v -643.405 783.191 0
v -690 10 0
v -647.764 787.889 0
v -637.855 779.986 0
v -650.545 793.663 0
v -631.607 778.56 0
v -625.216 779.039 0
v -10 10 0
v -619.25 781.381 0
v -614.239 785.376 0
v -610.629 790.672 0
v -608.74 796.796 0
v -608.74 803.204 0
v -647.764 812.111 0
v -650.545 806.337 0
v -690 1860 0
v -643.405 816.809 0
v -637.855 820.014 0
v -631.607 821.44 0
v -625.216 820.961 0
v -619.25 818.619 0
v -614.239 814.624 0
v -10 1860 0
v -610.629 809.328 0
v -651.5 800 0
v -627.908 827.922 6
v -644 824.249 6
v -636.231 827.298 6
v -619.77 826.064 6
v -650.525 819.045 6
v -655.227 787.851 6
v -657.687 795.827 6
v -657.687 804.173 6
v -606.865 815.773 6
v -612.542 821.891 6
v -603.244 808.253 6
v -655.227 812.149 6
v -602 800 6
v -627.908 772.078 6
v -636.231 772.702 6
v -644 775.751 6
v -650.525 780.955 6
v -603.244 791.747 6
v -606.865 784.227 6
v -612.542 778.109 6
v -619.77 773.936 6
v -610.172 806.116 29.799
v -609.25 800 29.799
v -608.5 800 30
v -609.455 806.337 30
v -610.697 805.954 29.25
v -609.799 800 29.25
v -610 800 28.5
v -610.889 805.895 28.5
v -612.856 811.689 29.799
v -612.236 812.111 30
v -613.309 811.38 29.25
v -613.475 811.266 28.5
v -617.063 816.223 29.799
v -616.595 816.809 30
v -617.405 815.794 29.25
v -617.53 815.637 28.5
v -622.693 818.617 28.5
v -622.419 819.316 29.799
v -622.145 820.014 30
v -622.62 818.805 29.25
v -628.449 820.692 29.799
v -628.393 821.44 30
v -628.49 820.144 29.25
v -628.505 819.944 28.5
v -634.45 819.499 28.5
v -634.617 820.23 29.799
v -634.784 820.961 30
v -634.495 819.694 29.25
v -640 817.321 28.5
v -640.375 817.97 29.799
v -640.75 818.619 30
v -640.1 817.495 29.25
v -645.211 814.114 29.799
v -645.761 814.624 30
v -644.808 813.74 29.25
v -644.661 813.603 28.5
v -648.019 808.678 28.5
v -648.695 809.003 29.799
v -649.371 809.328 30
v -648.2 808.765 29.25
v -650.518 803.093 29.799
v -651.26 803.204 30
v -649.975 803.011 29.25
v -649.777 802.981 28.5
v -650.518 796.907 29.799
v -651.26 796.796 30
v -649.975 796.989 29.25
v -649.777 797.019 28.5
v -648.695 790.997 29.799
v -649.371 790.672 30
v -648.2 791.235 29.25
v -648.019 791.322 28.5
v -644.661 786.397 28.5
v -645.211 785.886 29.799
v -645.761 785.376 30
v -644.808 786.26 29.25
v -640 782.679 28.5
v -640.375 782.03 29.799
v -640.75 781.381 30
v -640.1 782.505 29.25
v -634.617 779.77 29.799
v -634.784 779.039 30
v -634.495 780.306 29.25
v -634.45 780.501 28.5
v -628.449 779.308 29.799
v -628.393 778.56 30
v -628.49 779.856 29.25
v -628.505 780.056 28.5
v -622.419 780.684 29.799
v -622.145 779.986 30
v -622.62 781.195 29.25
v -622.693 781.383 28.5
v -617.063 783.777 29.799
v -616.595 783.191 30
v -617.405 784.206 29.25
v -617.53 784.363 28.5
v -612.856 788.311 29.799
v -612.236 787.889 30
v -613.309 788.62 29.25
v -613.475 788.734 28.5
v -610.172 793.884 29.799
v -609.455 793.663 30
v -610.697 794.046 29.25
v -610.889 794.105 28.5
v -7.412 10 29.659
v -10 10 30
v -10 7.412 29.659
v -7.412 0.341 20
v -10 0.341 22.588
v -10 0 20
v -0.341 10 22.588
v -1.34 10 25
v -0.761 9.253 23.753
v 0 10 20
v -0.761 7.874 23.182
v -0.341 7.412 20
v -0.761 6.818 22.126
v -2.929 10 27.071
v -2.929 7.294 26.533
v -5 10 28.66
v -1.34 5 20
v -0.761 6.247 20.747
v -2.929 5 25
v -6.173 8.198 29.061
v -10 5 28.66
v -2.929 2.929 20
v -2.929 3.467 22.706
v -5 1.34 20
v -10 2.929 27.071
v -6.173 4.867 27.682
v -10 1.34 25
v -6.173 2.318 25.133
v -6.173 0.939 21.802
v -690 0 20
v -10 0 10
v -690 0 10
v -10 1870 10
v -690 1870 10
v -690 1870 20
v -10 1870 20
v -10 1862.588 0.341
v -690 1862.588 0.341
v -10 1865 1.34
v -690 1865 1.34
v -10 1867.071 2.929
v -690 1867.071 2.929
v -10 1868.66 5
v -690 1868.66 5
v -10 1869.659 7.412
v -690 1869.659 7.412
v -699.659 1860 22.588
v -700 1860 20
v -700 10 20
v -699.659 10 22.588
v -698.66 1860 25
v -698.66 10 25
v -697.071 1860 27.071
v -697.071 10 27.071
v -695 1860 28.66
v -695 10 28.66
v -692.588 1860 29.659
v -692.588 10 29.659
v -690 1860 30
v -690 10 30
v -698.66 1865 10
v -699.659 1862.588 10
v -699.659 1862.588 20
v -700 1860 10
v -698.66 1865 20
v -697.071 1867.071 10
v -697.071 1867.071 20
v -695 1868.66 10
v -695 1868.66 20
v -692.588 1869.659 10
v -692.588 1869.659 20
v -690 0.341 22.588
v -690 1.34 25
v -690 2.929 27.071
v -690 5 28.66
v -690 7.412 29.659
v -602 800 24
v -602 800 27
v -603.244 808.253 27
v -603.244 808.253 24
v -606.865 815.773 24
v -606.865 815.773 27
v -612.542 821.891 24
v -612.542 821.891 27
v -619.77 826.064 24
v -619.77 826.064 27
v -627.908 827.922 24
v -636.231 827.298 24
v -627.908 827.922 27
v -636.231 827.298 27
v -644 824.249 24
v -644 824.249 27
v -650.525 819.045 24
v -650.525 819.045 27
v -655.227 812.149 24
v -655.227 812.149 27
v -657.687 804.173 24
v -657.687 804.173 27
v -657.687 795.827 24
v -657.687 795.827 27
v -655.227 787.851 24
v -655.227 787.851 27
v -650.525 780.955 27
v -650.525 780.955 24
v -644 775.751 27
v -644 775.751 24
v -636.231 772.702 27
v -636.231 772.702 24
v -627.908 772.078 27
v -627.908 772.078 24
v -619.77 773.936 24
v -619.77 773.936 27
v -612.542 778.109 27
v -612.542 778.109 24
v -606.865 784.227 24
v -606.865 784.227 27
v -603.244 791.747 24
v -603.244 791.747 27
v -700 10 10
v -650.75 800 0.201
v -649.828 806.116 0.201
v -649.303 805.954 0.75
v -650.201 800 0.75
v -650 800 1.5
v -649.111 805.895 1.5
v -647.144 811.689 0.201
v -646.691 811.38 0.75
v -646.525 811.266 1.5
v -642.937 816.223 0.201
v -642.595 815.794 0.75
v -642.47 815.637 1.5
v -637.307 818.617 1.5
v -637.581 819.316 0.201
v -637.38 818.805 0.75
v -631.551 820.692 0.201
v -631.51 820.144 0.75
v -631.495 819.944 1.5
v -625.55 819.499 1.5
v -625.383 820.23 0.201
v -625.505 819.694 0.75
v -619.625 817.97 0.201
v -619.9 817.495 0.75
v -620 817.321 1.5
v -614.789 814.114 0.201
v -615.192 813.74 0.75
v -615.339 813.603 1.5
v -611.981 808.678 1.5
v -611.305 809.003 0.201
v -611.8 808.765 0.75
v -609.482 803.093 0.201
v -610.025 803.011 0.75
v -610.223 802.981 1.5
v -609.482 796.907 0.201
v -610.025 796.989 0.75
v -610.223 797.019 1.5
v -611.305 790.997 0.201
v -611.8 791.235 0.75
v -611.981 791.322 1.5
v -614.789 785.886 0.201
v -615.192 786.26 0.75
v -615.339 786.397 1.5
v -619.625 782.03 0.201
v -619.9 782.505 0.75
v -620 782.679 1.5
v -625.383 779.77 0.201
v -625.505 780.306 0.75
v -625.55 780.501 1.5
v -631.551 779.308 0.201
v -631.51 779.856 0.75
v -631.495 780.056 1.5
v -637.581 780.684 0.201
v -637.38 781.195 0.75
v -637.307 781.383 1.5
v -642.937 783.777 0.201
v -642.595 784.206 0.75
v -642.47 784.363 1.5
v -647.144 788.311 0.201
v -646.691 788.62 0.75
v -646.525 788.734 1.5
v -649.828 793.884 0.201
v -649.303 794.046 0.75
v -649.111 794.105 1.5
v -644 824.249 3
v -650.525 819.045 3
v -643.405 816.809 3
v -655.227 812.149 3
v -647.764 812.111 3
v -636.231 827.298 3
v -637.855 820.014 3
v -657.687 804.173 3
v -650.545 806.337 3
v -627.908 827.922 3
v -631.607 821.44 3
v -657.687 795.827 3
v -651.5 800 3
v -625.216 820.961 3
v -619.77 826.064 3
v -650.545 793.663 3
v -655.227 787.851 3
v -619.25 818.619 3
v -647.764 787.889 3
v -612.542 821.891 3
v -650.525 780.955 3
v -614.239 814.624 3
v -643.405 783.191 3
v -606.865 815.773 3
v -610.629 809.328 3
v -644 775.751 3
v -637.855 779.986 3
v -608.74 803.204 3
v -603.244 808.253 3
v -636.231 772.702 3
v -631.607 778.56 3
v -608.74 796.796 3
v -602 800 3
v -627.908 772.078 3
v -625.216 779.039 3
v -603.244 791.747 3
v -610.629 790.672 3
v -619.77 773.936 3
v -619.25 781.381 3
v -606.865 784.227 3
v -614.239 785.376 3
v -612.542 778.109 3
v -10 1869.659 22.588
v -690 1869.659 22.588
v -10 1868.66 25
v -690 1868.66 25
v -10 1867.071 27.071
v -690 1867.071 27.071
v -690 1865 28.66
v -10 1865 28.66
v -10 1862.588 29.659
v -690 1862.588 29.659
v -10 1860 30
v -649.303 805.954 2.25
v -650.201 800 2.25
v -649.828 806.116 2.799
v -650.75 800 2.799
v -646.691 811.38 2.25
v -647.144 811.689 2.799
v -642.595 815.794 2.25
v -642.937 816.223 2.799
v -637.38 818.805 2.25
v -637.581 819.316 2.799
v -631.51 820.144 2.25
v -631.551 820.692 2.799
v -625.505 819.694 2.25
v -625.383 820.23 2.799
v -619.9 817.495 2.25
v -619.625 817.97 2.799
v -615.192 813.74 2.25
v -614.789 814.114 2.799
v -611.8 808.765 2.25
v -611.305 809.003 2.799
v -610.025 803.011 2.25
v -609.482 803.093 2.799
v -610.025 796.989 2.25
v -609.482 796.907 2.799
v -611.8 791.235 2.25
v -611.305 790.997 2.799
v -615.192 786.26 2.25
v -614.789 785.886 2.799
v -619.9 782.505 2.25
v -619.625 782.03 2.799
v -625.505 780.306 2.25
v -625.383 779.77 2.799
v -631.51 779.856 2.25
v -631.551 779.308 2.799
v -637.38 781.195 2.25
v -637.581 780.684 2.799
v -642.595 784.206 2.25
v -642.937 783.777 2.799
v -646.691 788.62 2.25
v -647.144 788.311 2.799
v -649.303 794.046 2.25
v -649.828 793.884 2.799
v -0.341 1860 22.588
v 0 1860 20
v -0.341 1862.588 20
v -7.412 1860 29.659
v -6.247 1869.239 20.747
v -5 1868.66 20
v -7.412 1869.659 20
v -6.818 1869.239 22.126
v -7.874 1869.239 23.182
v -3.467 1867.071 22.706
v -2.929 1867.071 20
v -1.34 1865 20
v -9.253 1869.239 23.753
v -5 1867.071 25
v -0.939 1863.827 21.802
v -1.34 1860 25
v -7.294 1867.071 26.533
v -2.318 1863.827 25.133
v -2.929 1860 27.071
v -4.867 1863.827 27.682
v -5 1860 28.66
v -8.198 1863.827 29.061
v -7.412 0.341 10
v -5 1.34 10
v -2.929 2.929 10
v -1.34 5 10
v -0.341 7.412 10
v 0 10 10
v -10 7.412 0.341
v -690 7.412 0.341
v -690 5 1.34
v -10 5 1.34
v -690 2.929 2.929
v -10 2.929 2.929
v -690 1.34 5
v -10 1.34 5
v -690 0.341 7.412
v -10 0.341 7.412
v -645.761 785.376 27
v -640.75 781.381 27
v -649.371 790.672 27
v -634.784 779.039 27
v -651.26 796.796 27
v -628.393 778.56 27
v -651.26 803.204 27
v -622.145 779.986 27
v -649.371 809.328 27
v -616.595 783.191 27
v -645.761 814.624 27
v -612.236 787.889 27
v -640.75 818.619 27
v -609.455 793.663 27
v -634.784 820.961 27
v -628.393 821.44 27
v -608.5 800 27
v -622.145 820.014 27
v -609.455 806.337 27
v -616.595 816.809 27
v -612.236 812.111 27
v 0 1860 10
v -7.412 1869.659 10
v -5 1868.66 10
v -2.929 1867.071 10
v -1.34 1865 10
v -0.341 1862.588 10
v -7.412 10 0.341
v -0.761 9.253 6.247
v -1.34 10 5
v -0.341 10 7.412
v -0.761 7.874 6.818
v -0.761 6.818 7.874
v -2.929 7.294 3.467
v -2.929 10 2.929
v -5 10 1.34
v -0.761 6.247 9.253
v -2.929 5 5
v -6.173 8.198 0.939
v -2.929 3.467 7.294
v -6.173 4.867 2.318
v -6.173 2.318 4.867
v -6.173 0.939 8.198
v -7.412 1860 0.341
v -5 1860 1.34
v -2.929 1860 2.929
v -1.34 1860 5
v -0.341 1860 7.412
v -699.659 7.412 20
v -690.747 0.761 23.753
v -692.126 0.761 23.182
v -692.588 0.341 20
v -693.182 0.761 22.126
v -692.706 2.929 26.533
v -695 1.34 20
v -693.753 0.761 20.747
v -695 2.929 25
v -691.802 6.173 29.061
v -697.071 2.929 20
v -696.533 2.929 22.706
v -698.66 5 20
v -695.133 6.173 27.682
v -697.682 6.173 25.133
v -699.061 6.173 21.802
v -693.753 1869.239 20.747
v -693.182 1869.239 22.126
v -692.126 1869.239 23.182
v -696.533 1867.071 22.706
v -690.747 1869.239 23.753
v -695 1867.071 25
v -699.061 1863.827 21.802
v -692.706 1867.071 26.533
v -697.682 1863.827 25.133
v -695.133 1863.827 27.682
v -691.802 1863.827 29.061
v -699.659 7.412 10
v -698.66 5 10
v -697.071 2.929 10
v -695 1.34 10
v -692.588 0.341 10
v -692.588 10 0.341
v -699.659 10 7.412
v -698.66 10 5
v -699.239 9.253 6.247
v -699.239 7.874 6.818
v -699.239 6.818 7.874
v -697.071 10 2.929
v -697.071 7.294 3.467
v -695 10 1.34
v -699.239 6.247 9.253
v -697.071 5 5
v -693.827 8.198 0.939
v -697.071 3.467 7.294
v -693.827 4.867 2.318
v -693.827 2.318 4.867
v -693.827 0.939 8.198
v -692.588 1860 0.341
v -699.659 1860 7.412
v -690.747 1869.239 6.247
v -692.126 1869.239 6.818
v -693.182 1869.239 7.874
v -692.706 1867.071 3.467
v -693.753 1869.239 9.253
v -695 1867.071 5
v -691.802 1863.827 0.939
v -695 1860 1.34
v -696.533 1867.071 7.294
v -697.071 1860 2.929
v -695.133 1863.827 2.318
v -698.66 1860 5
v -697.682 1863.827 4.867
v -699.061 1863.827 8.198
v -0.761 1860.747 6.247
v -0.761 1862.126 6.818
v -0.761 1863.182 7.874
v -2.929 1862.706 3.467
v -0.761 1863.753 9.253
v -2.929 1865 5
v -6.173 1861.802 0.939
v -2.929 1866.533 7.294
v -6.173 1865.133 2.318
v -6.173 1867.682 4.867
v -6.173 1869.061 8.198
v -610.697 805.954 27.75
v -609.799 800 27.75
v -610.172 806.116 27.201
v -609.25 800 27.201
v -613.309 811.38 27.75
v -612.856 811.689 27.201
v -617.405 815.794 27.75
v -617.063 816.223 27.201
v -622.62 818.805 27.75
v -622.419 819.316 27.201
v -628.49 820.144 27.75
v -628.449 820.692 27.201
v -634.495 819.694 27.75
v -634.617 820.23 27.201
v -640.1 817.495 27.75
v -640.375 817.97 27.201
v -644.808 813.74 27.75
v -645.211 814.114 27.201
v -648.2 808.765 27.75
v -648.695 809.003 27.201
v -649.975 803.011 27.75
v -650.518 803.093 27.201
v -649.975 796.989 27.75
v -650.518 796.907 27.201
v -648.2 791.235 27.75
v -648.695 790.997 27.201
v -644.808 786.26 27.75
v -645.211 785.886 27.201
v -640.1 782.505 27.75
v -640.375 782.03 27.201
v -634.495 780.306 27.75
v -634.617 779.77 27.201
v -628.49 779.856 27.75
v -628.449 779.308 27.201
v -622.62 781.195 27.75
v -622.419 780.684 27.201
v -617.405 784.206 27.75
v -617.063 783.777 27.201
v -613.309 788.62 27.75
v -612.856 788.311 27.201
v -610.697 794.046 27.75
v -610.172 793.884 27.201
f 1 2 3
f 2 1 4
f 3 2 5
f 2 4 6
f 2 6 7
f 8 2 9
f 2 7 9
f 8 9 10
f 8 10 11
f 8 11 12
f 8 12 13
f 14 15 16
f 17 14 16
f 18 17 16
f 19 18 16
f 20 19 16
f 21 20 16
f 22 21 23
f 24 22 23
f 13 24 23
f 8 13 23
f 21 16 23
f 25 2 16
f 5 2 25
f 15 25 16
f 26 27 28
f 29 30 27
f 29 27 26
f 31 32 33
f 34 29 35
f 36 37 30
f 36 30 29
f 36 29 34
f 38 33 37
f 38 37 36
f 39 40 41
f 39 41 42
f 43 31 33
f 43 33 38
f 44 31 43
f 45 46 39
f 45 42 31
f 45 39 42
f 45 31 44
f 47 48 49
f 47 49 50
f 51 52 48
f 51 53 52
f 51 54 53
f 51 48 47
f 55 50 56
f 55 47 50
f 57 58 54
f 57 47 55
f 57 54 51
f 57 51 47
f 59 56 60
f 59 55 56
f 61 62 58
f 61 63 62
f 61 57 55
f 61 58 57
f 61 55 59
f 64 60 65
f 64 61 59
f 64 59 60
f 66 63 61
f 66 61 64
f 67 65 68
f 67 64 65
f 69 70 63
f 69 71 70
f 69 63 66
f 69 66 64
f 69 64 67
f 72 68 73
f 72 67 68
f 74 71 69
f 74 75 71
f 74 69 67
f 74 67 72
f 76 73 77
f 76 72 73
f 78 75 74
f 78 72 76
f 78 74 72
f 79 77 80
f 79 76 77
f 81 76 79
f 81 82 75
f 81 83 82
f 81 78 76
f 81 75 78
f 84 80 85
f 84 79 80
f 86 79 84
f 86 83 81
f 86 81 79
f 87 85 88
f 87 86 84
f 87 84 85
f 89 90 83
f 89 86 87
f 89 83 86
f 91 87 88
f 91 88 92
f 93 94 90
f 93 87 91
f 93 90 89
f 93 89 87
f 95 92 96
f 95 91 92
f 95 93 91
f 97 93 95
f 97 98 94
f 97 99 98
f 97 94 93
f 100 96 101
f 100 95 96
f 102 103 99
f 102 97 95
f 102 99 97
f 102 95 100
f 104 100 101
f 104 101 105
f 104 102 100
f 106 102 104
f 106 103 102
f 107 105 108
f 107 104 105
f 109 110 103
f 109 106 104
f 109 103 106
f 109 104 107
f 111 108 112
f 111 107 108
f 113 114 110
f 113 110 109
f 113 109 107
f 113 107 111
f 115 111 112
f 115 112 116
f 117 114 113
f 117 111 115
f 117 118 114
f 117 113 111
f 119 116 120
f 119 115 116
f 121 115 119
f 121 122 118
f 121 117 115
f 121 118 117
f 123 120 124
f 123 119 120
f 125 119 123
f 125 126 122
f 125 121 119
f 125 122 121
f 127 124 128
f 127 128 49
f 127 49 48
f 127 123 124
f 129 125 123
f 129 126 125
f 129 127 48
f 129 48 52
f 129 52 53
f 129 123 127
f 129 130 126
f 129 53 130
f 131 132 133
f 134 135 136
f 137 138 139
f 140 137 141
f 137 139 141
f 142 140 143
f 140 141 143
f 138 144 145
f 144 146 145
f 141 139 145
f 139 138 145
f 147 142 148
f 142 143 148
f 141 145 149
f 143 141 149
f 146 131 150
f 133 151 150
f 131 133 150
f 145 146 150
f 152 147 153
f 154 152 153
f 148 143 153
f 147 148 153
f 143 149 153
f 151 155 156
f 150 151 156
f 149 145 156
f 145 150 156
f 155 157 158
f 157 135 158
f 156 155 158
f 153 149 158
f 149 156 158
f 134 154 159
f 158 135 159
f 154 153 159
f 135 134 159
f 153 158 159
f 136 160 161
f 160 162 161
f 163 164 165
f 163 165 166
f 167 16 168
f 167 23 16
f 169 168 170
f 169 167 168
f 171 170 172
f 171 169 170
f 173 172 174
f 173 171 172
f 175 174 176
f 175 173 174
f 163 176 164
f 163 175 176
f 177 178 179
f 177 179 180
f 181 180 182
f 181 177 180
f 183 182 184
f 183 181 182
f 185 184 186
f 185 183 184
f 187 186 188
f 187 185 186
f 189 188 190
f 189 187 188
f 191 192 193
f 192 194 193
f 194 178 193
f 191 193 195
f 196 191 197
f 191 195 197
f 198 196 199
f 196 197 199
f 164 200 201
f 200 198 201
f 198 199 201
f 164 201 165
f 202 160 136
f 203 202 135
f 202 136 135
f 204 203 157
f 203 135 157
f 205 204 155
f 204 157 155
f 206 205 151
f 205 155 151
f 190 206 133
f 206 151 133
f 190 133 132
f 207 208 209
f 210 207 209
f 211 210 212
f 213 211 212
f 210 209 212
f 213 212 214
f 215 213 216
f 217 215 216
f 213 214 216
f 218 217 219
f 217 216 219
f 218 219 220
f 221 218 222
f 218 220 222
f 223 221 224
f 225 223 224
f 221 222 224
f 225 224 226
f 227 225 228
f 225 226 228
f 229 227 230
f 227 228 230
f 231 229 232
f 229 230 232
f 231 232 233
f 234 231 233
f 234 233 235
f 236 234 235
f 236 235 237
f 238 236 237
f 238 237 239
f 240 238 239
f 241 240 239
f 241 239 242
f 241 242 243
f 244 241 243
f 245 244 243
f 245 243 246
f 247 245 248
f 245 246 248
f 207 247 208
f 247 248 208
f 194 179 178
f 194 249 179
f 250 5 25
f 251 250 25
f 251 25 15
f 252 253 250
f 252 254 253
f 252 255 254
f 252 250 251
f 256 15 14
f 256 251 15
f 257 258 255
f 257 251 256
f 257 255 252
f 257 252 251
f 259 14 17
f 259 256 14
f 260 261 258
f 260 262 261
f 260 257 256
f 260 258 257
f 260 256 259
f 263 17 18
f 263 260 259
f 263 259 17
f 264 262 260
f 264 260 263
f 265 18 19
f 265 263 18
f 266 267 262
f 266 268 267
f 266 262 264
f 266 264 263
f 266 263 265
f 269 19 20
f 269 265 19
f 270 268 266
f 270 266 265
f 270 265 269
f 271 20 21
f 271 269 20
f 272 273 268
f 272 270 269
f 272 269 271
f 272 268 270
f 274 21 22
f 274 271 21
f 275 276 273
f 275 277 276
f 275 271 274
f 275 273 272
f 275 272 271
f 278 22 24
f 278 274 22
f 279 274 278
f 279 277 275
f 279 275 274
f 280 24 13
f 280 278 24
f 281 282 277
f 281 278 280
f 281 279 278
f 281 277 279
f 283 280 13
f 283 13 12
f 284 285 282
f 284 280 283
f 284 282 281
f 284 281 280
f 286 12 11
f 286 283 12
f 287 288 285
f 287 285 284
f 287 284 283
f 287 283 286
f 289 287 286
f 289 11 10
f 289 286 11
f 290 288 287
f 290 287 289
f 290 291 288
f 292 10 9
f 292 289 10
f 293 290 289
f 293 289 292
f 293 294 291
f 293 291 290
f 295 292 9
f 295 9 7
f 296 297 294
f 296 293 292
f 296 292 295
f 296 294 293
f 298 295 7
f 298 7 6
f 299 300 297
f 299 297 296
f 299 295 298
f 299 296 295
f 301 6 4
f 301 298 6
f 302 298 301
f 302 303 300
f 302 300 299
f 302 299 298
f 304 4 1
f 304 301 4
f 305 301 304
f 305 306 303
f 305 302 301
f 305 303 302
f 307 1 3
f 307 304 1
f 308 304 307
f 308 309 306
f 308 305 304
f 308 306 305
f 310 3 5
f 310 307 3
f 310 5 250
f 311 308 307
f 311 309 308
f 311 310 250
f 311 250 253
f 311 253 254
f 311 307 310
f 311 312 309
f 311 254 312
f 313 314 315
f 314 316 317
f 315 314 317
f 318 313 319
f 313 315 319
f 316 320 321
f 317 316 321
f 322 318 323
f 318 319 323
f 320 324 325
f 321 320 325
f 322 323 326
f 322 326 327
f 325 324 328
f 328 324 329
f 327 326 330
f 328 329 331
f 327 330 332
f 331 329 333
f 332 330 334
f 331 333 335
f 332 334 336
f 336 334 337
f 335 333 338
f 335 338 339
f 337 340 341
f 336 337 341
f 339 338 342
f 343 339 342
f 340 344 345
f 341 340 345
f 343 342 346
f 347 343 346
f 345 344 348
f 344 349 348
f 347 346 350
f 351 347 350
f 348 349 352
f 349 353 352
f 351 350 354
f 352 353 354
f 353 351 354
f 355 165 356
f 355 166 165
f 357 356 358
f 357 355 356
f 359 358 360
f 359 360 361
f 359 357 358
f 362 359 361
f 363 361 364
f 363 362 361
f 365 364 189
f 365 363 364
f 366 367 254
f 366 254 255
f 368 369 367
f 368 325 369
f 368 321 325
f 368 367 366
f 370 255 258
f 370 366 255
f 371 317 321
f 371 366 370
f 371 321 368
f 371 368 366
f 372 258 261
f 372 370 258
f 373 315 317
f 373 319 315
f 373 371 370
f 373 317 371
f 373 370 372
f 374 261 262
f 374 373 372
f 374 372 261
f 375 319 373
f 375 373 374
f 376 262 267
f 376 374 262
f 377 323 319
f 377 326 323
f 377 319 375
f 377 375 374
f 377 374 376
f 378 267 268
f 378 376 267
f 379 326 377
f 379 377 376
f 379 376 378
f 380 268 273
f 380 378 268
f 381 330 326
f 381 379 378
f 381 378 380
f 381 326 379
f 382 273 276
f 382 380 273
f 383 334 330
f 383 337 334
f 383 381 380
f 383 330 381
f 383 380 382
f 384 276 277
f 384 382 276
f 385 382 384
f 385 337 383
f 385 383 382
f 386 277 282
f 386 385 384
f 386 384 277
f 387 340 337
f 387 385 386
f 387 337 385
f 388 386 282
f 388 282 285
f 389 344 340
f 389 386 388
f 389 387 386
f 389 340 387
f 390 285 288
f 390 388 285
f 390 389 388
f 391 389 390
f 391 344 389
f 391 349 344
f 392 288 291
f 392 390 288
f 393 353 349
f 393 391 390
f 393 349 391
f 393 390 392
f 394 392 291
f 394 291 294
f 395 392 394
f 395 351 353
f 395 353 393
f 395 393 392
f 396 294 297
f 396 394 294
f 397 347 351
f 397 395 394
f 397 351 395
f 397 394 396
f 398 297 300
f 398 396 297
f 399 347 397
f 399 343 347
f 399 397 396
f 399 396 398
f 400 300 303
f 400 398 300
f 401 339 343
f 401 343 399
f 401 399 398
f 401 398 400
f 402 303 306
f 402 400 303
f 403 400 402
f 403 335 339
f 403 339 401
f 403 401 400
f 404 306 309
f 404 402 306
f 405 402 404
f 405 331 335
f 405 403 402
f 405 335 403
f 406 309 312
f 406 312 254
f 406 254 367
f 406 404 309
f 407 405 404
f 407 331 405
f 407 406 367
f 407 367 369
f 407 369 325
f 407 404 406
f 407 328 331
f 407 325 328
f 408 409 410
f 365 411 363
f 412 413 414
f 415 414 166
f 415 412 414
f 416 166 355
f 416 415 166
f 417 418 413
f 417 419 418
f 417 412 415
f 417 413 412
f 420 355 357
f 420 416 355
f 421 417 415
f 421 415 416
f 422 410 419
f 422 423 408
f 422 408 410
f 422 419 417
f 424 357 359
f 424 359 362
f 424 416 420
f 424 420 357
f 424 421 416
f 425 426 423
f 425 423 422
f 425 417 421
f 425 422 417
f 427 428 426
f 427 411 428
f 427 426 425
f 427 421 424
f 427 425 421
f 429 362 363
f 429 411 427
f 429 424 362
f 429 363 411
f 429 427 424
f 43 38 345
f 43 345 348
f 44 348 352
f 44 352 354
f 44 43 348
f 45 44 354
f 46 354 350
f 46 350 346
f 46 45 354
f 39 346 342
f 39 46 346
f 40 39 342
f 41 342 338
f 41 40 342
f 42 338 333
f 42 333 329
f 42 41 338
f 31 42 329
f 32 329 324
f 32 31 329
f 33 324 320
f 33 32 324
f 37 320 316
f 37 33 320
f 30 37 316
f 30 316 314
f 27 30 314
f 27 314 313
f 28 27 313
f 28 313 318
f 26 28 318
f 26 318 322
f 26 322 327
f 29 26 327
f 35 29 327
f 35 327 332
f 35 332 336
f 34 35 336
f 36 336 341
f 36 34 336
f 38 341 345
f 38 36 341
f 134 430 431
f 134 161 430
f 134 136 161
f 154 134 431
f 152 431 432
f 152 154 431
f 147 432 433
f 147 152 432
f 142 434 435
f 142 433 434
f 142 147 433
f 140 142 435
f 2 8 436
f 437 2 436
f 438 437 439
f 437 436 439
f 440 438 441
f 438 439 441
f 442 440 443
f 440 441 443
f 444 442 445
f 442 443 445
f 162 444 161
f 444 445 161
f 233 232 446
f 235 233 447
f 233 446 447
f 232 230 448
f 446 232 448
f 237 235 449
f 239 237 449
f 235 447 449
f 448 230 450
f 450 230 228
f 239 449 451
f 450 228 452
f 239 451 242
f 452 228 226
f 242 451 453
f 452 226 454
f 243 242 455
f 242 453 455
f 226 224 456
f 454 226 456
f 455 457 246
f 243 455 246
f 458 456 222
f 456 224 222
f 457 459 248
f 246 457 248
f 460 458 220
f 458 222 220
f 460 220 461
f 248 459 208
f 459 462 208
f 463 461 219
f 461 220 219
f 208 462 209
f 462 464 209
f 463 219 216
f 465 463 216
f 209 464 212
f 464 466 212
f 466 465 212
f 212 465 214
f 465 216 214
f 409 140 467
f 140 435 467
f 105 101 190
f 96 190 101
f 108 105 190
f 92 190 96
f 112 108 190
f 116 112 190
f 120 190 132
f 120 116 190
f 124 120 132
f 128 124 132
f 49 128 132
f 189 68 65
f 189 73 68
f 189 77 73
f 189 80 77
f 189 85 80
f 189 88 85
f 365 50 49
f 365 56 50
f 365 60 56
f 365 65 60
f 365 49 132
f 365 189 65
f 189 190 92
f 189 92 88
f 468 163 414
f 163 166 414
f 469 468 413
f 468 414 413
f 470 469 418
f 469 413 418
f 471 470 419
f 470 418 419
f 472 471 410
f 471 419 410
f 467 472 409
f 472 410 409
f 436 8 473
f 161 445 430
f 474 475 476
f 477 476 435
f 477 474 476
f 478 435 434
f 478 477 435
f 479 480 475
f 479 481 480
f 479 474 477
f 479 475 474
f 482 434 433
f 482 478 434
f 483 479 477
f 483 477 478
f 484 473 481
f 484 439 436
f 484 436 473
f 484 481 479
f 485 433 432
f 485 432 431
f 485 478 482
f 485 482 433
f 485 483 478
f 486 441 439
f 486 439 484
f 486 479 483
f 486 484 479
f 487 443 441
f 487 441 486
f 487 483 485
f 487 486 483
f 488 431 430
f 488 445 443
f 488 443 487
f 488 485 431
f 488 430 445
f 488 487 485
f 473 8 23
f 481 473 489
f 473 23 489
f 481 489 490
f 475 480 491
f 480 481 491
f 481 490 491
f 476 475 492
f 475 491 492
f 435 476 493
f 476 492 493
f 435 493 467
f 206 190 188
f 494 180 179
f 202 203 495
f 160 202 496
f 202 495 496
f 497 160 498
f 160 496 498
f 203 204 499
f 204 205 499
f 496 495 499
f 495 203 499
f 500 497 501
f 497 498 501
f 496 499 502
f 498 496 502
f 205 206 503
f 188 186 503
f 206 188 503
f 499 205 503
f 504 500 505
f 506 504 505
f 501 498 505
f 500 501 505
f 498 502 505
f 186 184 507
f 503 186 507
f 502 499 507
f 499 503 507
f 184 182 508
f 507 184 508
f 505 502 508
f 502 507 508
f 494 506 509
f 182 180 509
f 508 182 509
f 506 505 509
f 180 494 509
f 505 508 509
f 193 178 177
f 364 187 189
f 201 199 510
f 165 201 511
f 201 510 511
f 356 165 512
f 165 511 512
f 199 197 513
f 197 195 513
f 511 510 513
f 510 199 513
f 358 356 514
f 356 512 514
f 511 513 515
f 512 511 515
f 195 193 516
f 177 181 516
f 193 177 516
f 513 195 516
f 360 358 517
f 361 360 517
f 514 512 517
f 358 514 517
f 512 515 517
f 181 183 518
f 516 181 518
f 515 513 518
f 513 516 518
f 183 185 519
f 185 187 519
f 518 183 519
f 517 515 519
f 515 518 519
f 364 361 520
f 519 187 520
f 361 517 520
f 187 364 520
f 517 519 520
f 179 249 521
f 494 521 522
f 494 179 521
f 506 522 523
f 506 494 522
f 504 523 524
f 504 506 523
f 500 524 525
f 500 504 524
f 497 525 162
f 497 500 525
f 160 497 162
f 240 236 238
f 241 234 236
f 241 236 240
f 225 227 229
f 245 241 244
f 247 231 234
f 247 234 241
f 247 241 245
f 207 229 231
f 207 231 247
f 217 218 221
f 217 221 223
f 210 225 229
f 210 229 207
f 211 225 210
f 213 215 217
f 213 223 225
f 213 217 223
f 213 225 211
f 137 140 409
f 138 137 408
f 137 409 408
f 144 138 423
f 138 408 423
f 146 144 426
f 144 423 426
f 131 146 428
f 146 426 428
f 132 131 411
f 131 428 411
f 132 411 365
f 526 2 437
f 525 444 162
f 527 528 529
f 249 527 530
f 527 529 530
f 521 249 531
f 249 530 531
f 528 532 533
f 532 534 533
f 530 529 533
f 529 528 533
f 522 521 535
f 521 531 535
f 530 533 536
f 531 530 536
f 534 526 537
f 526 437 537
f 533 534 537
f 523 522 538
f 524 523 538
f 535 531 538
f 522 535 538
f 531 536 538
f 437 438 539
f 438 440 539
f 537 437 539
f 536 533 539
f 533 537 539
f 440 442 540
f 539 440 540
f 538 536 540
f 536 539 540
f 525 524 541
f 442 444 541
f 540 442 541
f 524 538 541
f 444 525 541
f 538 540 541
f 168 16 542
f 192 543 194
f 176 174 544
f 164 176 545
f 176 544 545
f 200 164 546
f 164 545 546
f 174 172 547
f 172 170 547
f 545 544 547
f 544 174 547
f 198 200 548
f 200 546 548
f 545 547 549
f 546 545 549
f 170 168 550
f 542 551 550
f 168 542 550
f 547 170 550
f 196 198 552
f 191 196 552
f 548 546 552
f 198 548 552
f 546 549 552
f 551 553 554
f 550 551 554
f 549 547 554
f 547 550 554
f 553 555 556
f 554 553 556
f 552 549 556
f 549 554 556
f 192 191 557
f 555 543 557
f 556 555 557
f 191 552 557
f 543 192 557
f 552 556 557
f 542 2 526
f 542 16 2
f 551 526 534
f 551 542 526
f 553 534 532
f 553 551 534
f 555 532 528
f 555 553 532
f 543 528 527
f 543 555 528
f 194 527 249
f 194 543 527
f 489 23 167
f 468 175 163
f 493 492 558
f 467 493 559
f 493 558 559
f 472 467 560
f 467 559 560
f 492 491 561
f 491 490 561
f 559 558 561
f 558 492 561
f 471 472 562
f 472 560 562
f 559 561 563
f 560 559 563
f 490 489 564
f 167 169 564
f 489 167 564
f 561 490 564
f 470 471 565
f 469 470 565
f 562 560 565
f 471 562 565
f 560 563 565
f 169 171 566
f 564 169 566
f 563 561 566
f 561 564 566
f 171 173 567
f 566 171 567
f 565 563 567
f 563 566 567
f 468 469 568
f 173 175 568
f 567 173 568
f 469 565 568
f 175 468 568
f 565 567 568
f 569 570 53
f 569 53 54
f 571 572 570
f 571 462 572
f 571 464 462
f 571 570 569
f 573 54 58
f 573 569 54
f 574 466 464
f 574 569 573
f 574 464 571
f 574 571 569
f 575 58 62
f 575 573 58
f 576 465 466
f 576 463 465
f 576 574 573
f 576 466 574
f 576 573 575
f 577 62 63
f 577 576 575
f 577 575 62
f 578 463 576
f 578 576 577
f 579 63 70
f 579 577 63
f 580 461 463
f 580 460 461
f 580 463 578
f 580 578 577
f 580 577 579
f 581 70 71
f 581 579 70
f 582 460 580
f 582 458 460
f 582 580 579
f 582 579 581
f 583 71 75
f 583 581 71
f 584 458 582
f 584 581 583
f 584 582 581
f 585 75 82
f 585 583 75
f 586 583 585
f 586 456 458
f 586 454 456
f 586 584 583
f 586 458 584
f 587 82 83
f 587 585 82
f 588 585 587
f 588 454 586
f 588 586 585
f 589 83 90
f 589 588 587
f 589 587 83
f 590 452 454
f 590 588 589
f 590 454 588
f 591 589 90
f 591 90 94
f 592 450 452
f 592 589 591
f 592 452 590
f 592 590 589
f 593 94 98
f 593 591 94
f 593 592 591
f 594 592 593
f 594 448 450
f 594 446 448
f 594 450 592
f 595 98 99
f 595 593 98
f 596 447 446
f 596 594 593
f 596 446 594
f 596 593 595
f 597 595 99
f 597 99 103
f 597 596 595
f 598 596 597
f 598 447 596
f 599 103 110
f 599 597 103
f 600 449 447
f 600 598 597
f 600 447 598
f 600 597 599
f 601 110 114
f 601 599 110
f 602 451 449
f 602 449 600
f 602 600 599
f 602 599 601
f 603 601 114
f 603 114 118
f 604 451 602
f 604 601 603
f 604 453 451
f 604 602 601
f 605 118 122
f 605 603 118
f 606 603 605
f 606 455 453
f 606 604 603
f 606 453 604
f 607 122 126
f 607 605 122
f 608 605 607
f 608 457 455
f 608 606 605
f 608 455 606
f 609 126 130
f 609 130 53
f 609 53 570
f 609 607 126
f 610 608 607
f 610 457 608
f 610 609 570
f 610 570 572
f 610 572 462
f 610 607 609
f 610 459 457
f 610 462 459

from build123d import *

# Parameters (mm, degrees)
SKETCH1_W           = 700
SKETCH1_H           = 1870
BOSS_EXTRUDE1_DEPTH = 30
SKETCH2_R           = 20
CUT_EXTRUDE1_DEPTH  = 3
SKETCH3_R           = 28
CUT_EXTRUDE2_DEPTH  = 3
FILLET1_R           = 1.5
CUT_EXTRUDE3_START  = -3
SKETCH5_R           = 20
CUT_EXTRUDE3_DEPTH  = 3
CUT_EXTRUDE4_START  = -3
SKETCH6_R           = 28
CUT_EXTRUDE4_DEPTH  = 3
FILLET2_R           = 1.5
FILLET3_R           = 10


with BuildPart() as part:
    # Sketch1 → Boss-Extrude1 (new body)
    with BuildSketch(Plane.XY):
        with Locations((-350, 935)):
            Rectangle(SKETCH1_W, SKETCH1_H)
    extrude(amount=BOSS_EXTRUDE1_DEPTH)

    # Sketch2 → Cut-Extrude1 (cut)
    with BuildSketch(Plane.XY.offset(30)):
        with Locations((-630, 800)):
            Circle(SKETCH2_R)
    extrude(amount=-CUT_EXTRUDE1_DEPTH, mode=Mode.SUBTRACT)

    # Sketch3 → Cut-Extrude2 (cut)
    with BuildSketch(Plane.XY.offset(27)):
        with Locations((-630, 800)):
            Circle(SKETCH3_R)
    extrude(amount=-CUT_EXTRUDE2_DEPTH, mode=Mode.SUBTRACT)

    # Fillet1
    fillet1_edges = [part.edges().sort_by_distance(p)[0] for p in [
        (-650, 800, 30),
        (-650, 800, 27),
    ]]
    fillet(fillet1_edges, radius=FILLET1_R - 0.0001)  # a hair under: the kernel refuses the full size

    # Sketch5 → Cut-Extrude3 (cut)
    with BuildSketch(Plane(origin=(0, 0, 0), x_dir=(-1, 0, 0), z_dir=(0, 0, -1)).offset(CUT_EXTRUDE3_START)):
        with Locations((630, 800)):
            Circle(SKETCH5_R)
    extrude(amount=CUT_EXTRUDE3_DEPTH, mode=Mode.SUBTRACT)

    # Sketch6 → Cut-Extrude4 (cut)
    with BuildSketch(Plane(origin=(0, 0, 3), x_dir=(-1, 0, 0), z_dir=(0, 0, -1)).offset(CUT_EXTRUDE4_START)):
        with Locations(Location((630, 800, 0), (0, 0, 180))):
            Circle(SKETCH6_R)
    extrude(amount=CUT_EXTRUDE4_DEPTH, mode=Mode.SUBTRACT)

    # Fillet2
    fillet2_edges = [part.edges().sort_by_distance(p)[0] for p in [
        (-610, 800, 0),
        (-610, 800, 3),
    ]]
    fillet(fillet2_edges, radius=FILLET2_R - 0.0001)  # a hair under: the kernel refuses the full size

    # Fillet3
    fillet3_edges = [part.edges().sort_by_distance(p)[0] for p in [
        (-700, 935, 30),
        (-350, 0, 30),
        (0, 935, 30),
        (-350, 0, 0),
        (-700, 935, 0),
        (-350, 1870, 0),
        (0, 935, 0),
        (0, 0, 15),
        (-700, 0, 15),
        (-700, 1870, 15),
        (0, 1870, 15),
        (-350, 1870, 30),
    ]]
    fillet(fillet3_edges, radius=FILLET3_R)


solid = part.part
